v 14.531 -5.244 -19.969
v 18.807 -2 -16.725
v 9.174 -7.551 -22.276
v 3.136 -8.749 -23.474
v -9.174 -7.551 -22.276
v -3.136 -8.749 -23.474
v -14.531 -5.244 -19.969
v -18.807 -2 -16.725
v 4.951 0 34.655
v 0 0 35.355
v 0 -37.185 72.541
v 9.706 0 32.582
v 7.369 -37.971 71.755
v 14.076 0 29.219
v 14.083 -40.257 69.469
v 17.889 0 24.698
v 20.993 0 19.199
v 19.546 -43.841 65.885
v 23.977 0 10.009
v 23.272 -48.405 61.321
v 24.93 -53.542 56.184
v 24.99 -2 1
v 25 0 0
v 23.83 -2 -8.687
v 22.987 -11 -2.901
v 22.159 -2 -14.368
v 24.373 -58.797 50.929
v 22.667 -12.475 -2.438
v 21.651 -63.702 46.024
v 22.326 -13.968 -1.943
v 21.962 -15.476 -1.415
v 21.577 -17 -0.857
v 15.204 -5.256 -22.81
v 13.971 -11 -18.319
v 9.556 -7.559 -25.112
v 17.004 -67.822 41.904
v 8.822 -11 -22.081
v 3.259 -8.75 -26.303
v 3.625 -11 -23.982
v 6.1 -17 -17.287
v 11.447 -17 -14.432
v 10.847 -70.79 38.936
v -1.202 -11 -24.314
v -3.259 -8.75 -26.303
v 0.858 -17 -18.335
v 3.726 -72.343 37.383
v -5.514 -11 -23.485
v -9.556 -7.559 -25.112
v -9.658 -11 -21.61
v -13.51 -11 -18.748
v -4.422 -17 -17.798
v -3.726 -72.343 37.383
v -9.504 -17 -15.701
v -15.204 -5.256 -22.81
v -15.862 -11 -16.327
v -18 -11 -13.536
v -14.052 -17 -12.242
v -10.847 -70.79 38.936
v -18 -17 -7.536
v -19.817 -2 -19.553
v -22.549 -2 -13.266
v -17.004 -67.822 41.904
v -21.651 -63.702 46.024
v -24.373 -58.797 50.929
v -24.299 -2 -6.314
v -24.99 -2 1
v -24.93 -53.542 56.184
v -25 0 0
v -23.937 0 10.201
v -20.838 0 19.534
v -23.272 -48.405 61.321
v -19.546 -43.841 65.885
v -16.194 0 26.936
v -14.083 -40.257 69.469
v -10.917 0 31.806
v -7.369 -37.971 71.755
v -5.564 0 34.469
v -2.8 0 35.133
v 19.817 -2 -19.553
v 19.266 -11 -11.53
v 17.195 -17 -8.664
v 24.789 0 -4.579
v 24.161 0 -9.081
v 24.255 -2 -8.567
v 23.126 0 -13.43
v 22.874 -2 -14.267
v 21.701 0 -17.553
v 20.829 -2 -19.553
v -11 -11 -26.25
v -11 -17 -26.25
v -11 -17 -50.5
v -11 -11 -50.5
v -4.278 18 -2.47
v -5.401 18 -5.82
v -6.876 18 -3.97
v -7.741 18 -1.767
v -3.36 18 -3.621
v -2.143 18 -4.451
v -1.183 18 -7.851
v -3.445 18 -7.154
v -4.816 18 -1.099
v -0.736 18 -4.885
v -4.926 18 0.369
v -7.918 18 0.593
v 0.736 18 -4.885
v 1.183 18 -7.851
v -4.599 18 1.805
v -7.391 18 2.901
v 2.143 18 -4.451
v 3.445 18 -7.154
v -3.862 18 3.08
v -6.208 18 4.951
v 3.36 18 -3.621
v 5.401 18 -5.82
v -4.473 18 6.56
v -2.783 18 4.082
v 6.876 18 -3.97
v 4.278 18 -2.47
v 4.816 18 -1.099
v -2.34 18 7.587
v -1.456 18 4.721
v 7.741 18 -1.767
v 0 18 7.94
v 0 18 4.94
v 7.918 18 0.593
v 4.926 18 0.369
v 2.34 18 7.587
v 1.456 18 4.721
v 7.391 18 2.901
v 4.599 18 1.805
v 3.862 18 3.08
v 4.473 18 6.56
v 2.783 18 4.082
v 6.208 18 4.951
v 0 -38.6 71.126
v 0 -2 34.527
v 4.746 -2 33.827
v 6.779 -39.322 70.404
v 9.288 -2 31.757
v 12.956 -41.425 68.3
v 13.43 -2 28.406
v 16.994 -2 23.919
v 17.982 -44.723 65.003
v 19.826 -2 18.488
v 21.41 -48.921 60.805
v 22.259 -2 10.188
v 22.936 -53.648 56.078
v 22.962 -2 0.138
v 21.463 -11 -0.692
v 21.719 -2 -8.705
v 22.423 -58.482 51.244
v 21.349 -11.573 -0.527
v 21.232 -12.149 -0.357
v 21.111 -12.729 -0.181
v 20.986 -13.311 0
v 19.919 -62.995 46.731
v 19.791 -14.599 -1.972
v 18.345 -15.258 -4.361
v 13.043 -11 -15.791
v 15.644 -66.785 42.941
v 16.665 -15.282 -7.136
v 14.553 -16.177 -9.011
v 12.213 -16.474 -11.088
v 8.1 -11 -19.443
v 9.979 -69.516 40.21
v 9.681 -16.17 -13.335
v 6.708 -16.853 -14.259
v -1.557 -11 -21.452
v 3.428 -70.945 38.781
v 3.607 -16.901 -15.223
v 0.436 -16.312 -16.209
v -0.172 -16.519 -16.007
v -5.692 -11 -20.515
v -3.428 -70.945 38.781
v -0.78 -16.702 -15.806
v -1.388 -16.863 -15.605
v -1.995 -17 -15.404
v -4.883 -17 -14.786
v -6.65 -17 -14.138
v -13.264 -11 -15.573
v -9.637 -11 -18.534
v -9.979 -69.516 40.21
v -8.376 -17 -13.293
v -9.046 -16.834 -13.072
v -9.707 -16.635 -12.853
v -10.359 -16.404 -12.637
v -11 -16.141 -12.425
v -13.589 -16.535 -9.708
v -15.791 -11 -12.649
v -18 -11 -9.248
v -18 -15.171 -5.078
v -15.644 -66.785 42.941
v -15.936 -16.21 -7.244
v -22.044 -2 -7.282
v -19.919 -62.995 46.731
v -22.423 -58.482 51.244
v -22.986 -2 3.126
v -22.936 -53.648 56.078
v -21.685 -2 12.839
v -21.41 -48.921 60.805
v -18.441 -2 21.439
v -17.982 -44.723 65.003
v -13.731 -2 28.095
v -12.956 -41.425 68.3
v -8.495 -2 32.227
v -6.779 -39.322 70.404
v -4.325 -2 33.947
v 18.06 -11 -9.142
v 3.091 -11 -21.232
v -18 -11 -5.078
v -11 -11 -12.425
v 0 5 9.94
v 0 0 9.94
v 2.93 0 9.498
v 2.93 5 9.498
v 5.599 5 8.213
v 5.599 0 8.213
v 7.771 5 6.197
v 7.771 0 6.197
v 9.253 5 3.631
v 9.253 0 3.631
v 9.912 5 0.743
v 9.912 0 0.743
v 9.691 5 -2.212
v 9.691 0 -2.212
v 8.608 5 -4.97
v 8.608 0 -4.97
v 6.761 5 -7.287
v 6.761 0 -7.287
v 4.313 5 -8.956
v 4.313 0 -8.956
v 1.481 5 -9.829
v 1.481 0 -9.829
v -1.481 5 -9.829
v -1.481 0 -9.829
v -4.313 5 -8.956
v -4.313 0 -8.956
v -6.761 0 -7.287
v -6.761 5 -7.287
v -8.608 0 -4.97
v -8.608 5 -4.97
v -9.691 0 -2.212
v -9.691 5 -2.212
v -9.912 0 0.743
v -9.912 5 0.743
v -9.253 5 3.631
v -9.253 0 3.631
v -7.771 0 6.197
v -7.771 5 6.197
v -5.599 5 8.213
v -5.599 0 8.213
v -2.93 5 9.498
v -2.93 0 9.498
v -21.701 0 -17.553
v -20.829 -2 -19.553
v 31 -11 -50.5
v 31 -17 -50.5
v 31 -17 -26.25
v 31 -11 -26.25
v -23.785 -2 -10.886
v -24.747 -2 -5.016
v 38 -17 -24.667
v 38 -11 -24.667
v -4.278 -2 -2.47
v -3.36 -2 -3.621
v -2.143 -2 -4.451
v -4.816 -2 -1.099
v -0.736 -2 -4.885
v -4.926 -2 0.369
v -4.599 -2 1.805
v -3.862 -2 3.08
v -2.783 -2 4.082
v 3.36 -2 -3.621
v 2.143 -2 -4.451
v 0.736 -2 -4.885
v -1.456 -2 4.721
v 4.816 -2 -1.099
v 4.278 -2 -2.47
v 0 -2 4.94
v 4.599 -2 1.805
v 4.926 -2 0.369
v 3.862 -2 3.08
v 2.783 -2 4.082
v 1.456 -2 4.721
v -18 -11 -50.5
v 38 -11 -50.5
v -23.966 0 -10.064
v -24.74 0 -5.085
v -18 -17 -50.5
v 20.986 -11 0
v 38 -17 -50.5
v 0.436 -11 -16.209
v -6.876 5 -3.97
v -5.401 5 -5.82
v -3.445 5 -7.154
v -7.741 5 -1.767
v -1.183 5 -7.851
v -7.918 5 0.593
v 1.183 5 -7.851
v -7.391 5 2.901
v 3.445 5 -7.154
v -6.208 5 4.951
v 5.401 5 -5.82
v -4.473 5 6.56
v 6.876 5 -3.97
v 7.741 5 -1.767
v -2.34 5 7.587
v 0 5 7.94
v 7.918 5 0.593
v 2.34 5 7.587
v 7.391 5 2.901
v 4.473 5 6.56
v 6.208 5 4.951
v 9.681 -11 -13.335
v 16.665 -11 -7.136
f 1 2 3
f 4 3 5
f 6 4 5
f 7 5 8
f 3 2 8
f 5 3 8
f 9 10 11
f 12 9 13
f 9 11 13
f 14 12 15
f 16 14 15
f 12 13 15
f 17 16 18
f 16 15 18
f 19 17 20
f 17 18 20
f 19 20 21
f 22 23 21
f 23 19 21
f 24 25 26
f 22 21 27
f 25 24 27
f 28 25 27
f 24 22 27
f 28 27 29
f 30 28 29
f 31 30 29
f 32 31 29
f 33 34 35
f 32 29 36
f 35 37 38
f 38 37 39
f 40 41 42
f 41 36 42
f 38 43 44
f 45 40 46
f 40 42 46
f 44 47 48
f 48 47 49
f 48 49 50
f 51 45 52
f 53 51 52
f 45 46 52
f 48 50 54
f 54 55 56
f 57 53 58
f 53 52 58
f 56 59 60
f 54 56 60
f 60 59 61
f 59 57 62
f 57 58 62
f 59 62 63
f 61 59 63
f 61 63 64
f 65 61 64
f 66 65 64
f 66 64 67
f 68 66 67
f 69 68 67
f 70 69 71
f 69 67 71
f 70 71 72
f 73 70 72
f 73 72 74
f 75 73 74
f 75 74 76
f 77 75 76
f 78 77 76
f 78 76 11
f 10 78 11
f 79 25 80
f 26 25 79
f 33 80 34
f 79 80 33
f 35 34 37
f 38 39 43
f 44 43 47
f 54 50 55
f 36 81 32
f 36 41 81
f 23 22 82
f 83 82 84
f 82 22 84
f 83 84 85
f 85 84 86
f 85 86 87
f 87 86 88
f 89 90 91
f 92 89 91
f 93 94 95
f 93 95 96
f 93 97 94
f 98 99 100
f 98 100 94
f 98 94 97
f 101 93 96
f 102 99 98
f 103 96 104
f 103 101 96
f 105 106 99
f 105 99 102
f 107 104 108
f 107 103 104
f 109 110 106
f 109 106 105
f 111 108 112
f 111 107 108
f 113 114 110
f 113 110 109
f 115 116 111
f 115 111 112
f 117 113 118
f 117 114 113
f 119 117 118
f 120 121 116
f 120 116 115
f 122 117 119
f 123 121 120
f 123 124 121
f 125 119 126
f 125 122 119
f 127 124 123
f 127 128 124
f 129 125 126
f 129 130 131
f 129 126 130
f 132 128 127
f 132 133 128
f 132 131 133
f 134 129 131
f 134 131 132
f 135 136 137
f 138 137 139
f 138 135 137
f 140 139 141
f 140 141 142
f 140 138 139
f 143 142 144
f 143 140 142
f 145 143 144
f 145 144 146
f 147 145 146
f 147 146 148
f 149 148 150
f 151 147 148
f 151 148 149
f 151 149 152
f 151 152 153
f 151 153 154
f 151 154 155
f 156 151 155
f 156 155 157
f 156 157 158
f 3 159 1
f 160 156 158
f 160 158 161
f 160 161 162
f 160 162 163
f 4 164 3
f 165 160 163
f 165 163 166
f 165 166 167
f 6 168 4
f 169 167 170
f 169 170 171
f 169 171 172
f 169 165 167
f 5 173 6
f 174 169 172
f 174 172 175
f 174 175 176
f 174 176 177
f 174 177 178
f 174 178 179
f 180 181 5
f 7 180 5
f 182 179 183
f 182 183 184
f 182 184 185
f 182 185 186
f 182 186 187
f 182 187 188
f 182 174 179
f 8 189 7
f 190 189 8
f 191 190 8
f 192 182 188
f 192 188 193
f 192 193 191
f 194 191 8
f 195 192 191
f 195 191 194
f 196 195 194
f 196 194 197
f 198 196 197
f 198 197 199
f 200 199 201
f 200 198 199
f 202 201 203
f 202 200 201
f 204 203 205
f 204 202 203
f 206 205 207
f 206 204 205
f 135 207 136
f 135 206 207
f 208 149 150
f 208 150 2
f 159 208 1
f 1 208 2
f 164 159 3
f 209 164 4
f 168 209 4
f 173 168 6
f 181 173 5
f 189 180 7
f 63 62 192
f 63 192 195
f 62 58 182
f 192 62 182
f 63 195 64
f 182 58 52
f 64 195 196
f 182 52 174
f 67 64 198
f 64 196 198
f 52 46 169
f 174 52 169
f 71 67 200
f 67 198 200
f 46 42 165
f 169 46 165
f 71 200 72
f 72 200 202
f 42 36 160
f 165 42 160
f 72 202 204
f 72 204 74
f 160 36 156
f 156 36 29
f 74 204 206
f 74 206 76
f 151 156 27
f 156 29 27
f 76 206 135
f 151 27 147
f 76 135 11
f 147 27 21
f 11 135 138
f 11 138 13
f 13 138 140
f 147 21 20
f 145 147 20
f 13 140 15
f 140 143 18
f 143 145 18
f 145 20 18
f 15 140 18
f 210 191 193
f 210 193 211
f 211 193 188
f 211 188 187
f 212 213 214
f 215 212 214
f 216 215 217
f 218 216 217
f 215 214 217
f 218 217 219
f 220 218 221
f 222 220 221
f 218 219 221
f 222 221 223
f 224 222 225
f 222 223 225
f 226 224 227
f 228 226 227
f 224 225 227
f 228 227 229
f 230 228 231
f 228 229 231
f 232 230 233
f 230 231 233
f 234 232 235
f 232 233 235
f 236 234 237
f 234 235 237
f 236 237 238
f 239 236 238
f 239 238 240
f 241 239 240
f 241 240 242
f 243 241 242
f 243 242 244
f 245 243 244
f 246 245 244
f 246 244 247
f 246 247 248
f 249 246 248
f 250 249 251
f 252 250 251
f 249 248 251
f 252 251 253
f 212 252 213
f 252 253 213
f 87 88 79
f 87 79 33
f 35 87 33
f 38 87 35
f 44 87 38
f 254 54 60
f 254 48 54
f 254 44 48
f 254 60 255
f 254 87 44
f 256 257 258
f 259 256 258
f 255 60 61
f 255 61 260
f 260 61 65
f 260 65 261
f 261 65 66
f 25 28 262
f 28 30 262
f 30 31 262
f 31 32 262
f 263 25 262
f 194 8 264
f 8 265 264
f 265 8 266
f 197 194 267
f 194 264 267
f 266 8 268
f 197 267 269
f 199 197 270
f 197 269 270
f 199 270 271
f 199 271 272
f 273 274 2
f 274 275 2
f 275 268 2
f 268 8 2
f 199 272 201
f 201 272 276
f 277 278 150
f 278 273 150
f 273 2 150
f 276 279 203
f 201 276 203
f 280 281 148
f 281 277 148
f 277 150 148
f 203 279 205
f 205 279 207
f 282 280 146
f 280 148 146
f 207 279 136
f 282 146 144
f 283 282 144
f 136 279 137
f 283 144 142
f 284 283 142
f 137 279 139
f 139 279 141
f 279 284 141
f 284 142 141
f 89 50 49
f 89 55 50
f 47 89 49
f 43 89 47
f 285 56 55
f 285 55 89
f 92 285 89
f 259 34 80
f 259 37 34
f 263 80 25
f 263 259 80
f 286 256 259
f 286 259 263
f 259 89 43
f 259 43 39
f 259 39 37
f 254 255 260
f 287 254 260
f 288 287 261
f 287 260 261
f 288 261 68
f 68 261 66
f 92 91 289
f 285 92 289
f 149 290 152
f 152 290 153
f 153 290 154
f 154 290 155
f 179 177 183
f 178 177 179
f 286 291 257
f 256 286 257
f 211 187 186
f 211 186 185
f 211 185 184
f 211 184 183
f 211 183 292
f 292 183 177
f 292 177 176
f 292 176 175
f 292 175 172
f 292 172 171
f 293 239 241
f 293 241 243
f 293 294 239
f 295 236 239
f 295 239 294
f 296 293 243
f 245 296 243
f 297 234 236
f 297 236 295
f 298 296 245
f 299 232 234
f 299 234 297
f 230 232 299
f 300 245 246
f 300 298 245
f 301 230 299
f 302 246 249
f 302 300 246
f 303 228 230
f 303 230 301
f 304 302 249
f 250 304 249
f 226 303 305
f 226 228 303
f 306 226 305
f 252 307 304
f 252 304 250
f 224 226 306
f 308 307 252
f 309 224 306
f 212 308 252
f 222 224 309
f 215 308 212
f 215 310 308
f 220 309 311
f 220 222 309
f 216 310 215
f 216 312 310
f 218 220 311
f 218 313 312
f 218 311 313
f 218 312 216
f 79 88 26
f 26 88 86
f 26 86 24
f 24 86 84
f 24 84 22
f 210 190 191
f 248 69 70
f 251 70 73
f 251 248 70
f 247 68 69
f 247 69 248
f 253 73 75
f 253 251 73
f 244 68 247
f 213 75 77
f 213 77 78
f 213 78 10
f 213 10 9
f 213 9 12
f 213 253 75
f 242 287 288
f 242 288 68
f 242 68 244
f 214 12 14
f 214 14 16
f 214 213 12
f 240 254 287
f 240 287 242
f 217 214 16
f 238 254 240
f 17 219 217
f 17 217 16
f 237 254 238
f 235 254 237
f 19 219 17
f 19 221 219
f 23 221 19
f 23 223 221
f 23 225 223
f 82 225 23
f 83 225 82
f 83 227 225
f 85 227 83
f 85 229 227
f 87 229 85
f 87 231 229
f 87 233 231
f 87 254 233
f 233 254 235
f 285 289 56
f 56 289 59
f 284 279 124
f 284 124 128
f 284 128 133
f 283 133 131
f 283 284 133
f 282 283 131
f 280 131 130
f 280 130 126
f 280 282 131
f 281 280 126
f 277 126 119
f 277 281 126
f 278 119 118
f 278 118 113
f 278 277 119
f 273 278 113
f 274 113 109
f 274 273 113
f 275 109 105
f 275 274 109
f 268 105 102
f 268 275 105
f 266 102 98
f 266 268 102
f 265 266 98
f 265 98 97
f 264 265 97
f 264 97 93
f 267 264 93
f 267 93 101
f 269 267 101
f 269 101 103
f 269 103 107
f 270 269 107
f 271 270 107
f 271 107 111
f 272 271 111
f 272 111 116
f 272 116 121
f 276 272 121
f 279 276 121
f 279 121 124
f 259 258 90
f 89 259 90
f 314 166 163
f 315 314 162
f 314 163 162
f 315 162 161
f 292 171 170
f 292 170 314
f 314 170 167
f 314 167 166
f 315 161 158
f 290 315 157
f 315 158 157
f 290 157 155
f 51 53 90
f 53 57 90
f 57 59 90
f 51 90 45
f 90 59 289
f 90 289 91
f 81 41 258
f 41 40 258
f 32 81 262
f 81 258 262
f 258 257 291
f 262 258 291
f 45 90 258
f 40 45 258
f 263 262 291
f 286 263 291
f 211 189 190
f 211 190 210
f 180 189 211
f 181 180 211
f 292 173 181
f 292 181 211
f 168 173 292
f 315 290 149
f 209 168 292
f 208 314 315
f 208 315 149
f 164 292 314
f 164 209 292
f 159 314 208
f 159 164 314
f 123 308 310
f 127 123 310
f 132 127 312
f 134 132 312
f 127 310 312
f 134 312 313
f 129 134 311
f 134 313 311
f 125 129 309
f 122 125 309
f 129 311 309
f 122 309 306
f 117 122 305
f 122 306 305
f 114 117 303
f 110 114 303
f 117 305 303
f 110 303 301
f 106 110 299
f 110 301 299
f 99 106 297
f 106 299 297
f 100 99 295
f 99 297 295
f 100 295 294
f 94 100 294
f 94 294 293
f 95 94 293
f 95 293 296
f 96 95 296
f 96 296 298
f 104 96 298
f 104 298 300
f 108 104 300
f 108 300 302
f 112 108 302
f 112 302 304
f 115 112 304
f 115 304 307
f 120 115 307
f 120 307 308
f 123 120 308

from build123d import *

# Parameters (mm, degrees)
SKETCH1_R                 = 9.94
SKETCH1_R_2               = 7.94
BOSS_EXTRUDE3_DEPTH       = 5
SKETCH1_6_R               = 7.94
SKETCH1_6_R_2             = 4.94
BOSS_EXTRUDE4_DEPTH       = 18
BOSS_EXTRUDE7_DEPTH       = 40
BOSS_EXTRUDE7_DEPTH_BACK  = 70
SKETCH4_R                 = 25
SKETCH4_R_2               = 23
SKETCH7_W                 = 197.712308018
SKETCH7_H                 = 113.854833504
CUT_EXTRUDE4_DEPTH        = 64
BOSS_EXTRUDE9_START       = -2
SKETCH9_RX                = 35.355339059
SKETCH9_RY                = 25
SKETCH9_R                 = 4.94
BOSS_EXTRUDE9_DEPTH       = 2
SKETCH13_W                = 94.503894001
SKETCH13_H                = 33.113273172
CUT_EXTRUDE7_DEPTH        = 32
BOSS_EXTRUDE11_START      = -2
BOSS_EXTRUDE11_DEPTH      = 2
BOSS_EXTRUDE12_DEPTH      = 2
BOSS_EXTRUDE12_DEPTH_BACK = 4


with BuildPart() as part:
    # Sketch1 → Boss-Extrude3 (new body)
    with BuildSketch(Plane(origin=(0, 0, 0), x_dir=(1, 0, 0), z_dir=(0, 1, 0))):
        with Locations(Location((0, 0, 0), (0, 0, 270))):
            Circle(SKETCH1_R)
        with Locations(Location((0, 0, 0), (0, 0, 270))):
            Circle(SKETCH1_R_2, mode=Mode.SUBTRACT)
    extrude(amount=BOSS_EXTRUDE3_DEPTH)

    # Sketch1<6> → Boss-Extrude4 (add)
    with BuildSketch(Plane(origin=(0, 0, 0), x_dir=(1, 0, 0), z_dir=(0, 1, 0))):
        with Locations(Location((0, 0, 0), (0, 0, 270))):
            Circle(SKETCH1_6_R)
        with Locations(Location((0, 0, 0), (0, 0, 270))):
            Circle(SKETCH1_6_R_2, mode=Mode.SUBTRACT)
    extrude(amount=BOSS_EXTRUDE4_DEPTH)



with BuildPart() as body_2:
    # Sketch4 → Boss-Extrude7 (new, two sides: drawn at the far end of the back side and taken through both)
    with BuildSketch(Plane(origin=(0, -5.365491749, 5.365491749), x_dir=(-1, 0, 0), z_dir=(0, 0.7071067811865458, -0.7071067811865492)).offset(-BOSS_EXTRUDE7_DEPTH_BACK)):
        with Locations(Location((0, 0, 0), (0, 0, 90))):
            Circle(SKETCH4_R)
        with Locations(Location((0, 0, 0), (0, 0, 90))):
            Circle(SKETCH4_R_2, mode=Mode.SUBTRACT)
    extrude(amount=BOSS_EXTRUDE7_DEPTH + BOSS_EXTRUDE7_DEPTH_BACK)

    # Sketch7 → Cut-Extrude4 (cut)
    with BuildSketch(Plane(origin=(0, 0, 0), x_dir=(1, 0, 0), z_dir=(0, 1, 0))):
        Rectangle(SKETCH7_W, SKETCH7_H)
    extrude(amount=CUT_EXTRUDE4_DEPTH, mode=Mode.SUBTRACT)


with BuildPart() as part_1:
    add(part.part)

    add(body_2.part)  # Boss-Extrude9 merges body 2
    # Sketch9 → Boss-Extrude9 (add)
    with BuildSketch(Plane(origin=(0, 0, 0), x_dir=(1, 0, 0), z_dir=(0, 1, 0)).offset(BOSS_EXTRUDE9_START)):
        with Locations(Location((0, 0), (0, 0, -90))):
            Ellipse(SKETCH9_RX, SKETCH9_RY)
        with Locations(Location((0, 0, 0), (0, 0, 270))):
            Circle(SKETCH9_R, mode=Mode.SUBTRACT)
    extrude(amount=BOSS_EXTRUDE9_DEPTH)

    # Sketch13 → Cut-Extrude7 (cut)
    with BuildSketch(Plane(origin=(0, 8.776643875, -8.776643875), x_dir=(-1, 0, 0), z_dir=(0, 0.7071067811865458, -0.7071067811865492))):
        with Locations((18.042265065, -27.160500048)):
            Rectangle(SKETCH13_W, SKETCH13_H)
    extrude(amount=CUT_EXTRUDE7_DEPTH, mode=Mode.SUBTRACT)

    # Boss-Extrude11: read off the stored shape, not the designer's step
    # Boss-Extrude11 outline → Boss-Extrude11 (add)
    with BuildSketch(Plane(origin=(0, 8.776643875, -8.776643875), x_dir=(-1, 0, 0), z_dir=(0, 0.7071067811865458, -0.7071067811865492)).offset(BOSS_EXTRUDE11_START)):
        with BuildLine():
            Line((18.806642372, -13.240475924), (-18.806642372, -13.240475924))
            ThreePointArc((-18.806642372, -13.240475924), (0, -23), (18.806642372, -13.240475924))
        make_face()
    extrude(amount=BOSS_EXTRUDE11_DEPTH)

    # Sketch15 → Boss-Extrude12 (add, two sides: drawn at the far end of the back side and taken through both)
    with BuildSketch(Plane(origin=(0, -13, 0), x_dir=(1, 0, 0), z_dir=(0, 1, 0)).offset(-BOSS_EXTRUDE12_DEPTH_BACK)):
        Polygon((-18, 50.5), (-18, 5.077623205), (-11, 12.425207431), (0.436295729, 16.20866498), (9.681434559, 13.33514052), (16.664877802, 7.136081647), (20.985766733, 0), (38, 24.667240496), (38, 50.5), (31, 50.5), (31, 26.250403727), (-11, 26.250403727), (-11, 50.5), align=None)
    extrude(amount=BOSS_EXTRUDE12_DEPTH + BOSS_EXTRUDE12_DEPTH_BACK)


solid = part_1.part
